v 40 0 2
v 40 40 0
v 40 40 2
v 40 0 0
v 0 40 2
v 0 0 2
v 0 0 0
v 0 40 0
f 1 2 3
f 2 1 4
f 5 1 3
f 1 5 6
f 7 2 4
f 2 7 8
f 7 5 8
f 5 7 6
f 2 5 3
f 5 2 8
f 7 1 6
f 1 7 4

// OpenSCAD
difference(){
	union(){ 

        difference(){
            union(){ 

                translate([0, 0,0]){
                       cube([40,40,2], center=false);
                }                              

            }
        }

	}
	union() {
    }
}


 
